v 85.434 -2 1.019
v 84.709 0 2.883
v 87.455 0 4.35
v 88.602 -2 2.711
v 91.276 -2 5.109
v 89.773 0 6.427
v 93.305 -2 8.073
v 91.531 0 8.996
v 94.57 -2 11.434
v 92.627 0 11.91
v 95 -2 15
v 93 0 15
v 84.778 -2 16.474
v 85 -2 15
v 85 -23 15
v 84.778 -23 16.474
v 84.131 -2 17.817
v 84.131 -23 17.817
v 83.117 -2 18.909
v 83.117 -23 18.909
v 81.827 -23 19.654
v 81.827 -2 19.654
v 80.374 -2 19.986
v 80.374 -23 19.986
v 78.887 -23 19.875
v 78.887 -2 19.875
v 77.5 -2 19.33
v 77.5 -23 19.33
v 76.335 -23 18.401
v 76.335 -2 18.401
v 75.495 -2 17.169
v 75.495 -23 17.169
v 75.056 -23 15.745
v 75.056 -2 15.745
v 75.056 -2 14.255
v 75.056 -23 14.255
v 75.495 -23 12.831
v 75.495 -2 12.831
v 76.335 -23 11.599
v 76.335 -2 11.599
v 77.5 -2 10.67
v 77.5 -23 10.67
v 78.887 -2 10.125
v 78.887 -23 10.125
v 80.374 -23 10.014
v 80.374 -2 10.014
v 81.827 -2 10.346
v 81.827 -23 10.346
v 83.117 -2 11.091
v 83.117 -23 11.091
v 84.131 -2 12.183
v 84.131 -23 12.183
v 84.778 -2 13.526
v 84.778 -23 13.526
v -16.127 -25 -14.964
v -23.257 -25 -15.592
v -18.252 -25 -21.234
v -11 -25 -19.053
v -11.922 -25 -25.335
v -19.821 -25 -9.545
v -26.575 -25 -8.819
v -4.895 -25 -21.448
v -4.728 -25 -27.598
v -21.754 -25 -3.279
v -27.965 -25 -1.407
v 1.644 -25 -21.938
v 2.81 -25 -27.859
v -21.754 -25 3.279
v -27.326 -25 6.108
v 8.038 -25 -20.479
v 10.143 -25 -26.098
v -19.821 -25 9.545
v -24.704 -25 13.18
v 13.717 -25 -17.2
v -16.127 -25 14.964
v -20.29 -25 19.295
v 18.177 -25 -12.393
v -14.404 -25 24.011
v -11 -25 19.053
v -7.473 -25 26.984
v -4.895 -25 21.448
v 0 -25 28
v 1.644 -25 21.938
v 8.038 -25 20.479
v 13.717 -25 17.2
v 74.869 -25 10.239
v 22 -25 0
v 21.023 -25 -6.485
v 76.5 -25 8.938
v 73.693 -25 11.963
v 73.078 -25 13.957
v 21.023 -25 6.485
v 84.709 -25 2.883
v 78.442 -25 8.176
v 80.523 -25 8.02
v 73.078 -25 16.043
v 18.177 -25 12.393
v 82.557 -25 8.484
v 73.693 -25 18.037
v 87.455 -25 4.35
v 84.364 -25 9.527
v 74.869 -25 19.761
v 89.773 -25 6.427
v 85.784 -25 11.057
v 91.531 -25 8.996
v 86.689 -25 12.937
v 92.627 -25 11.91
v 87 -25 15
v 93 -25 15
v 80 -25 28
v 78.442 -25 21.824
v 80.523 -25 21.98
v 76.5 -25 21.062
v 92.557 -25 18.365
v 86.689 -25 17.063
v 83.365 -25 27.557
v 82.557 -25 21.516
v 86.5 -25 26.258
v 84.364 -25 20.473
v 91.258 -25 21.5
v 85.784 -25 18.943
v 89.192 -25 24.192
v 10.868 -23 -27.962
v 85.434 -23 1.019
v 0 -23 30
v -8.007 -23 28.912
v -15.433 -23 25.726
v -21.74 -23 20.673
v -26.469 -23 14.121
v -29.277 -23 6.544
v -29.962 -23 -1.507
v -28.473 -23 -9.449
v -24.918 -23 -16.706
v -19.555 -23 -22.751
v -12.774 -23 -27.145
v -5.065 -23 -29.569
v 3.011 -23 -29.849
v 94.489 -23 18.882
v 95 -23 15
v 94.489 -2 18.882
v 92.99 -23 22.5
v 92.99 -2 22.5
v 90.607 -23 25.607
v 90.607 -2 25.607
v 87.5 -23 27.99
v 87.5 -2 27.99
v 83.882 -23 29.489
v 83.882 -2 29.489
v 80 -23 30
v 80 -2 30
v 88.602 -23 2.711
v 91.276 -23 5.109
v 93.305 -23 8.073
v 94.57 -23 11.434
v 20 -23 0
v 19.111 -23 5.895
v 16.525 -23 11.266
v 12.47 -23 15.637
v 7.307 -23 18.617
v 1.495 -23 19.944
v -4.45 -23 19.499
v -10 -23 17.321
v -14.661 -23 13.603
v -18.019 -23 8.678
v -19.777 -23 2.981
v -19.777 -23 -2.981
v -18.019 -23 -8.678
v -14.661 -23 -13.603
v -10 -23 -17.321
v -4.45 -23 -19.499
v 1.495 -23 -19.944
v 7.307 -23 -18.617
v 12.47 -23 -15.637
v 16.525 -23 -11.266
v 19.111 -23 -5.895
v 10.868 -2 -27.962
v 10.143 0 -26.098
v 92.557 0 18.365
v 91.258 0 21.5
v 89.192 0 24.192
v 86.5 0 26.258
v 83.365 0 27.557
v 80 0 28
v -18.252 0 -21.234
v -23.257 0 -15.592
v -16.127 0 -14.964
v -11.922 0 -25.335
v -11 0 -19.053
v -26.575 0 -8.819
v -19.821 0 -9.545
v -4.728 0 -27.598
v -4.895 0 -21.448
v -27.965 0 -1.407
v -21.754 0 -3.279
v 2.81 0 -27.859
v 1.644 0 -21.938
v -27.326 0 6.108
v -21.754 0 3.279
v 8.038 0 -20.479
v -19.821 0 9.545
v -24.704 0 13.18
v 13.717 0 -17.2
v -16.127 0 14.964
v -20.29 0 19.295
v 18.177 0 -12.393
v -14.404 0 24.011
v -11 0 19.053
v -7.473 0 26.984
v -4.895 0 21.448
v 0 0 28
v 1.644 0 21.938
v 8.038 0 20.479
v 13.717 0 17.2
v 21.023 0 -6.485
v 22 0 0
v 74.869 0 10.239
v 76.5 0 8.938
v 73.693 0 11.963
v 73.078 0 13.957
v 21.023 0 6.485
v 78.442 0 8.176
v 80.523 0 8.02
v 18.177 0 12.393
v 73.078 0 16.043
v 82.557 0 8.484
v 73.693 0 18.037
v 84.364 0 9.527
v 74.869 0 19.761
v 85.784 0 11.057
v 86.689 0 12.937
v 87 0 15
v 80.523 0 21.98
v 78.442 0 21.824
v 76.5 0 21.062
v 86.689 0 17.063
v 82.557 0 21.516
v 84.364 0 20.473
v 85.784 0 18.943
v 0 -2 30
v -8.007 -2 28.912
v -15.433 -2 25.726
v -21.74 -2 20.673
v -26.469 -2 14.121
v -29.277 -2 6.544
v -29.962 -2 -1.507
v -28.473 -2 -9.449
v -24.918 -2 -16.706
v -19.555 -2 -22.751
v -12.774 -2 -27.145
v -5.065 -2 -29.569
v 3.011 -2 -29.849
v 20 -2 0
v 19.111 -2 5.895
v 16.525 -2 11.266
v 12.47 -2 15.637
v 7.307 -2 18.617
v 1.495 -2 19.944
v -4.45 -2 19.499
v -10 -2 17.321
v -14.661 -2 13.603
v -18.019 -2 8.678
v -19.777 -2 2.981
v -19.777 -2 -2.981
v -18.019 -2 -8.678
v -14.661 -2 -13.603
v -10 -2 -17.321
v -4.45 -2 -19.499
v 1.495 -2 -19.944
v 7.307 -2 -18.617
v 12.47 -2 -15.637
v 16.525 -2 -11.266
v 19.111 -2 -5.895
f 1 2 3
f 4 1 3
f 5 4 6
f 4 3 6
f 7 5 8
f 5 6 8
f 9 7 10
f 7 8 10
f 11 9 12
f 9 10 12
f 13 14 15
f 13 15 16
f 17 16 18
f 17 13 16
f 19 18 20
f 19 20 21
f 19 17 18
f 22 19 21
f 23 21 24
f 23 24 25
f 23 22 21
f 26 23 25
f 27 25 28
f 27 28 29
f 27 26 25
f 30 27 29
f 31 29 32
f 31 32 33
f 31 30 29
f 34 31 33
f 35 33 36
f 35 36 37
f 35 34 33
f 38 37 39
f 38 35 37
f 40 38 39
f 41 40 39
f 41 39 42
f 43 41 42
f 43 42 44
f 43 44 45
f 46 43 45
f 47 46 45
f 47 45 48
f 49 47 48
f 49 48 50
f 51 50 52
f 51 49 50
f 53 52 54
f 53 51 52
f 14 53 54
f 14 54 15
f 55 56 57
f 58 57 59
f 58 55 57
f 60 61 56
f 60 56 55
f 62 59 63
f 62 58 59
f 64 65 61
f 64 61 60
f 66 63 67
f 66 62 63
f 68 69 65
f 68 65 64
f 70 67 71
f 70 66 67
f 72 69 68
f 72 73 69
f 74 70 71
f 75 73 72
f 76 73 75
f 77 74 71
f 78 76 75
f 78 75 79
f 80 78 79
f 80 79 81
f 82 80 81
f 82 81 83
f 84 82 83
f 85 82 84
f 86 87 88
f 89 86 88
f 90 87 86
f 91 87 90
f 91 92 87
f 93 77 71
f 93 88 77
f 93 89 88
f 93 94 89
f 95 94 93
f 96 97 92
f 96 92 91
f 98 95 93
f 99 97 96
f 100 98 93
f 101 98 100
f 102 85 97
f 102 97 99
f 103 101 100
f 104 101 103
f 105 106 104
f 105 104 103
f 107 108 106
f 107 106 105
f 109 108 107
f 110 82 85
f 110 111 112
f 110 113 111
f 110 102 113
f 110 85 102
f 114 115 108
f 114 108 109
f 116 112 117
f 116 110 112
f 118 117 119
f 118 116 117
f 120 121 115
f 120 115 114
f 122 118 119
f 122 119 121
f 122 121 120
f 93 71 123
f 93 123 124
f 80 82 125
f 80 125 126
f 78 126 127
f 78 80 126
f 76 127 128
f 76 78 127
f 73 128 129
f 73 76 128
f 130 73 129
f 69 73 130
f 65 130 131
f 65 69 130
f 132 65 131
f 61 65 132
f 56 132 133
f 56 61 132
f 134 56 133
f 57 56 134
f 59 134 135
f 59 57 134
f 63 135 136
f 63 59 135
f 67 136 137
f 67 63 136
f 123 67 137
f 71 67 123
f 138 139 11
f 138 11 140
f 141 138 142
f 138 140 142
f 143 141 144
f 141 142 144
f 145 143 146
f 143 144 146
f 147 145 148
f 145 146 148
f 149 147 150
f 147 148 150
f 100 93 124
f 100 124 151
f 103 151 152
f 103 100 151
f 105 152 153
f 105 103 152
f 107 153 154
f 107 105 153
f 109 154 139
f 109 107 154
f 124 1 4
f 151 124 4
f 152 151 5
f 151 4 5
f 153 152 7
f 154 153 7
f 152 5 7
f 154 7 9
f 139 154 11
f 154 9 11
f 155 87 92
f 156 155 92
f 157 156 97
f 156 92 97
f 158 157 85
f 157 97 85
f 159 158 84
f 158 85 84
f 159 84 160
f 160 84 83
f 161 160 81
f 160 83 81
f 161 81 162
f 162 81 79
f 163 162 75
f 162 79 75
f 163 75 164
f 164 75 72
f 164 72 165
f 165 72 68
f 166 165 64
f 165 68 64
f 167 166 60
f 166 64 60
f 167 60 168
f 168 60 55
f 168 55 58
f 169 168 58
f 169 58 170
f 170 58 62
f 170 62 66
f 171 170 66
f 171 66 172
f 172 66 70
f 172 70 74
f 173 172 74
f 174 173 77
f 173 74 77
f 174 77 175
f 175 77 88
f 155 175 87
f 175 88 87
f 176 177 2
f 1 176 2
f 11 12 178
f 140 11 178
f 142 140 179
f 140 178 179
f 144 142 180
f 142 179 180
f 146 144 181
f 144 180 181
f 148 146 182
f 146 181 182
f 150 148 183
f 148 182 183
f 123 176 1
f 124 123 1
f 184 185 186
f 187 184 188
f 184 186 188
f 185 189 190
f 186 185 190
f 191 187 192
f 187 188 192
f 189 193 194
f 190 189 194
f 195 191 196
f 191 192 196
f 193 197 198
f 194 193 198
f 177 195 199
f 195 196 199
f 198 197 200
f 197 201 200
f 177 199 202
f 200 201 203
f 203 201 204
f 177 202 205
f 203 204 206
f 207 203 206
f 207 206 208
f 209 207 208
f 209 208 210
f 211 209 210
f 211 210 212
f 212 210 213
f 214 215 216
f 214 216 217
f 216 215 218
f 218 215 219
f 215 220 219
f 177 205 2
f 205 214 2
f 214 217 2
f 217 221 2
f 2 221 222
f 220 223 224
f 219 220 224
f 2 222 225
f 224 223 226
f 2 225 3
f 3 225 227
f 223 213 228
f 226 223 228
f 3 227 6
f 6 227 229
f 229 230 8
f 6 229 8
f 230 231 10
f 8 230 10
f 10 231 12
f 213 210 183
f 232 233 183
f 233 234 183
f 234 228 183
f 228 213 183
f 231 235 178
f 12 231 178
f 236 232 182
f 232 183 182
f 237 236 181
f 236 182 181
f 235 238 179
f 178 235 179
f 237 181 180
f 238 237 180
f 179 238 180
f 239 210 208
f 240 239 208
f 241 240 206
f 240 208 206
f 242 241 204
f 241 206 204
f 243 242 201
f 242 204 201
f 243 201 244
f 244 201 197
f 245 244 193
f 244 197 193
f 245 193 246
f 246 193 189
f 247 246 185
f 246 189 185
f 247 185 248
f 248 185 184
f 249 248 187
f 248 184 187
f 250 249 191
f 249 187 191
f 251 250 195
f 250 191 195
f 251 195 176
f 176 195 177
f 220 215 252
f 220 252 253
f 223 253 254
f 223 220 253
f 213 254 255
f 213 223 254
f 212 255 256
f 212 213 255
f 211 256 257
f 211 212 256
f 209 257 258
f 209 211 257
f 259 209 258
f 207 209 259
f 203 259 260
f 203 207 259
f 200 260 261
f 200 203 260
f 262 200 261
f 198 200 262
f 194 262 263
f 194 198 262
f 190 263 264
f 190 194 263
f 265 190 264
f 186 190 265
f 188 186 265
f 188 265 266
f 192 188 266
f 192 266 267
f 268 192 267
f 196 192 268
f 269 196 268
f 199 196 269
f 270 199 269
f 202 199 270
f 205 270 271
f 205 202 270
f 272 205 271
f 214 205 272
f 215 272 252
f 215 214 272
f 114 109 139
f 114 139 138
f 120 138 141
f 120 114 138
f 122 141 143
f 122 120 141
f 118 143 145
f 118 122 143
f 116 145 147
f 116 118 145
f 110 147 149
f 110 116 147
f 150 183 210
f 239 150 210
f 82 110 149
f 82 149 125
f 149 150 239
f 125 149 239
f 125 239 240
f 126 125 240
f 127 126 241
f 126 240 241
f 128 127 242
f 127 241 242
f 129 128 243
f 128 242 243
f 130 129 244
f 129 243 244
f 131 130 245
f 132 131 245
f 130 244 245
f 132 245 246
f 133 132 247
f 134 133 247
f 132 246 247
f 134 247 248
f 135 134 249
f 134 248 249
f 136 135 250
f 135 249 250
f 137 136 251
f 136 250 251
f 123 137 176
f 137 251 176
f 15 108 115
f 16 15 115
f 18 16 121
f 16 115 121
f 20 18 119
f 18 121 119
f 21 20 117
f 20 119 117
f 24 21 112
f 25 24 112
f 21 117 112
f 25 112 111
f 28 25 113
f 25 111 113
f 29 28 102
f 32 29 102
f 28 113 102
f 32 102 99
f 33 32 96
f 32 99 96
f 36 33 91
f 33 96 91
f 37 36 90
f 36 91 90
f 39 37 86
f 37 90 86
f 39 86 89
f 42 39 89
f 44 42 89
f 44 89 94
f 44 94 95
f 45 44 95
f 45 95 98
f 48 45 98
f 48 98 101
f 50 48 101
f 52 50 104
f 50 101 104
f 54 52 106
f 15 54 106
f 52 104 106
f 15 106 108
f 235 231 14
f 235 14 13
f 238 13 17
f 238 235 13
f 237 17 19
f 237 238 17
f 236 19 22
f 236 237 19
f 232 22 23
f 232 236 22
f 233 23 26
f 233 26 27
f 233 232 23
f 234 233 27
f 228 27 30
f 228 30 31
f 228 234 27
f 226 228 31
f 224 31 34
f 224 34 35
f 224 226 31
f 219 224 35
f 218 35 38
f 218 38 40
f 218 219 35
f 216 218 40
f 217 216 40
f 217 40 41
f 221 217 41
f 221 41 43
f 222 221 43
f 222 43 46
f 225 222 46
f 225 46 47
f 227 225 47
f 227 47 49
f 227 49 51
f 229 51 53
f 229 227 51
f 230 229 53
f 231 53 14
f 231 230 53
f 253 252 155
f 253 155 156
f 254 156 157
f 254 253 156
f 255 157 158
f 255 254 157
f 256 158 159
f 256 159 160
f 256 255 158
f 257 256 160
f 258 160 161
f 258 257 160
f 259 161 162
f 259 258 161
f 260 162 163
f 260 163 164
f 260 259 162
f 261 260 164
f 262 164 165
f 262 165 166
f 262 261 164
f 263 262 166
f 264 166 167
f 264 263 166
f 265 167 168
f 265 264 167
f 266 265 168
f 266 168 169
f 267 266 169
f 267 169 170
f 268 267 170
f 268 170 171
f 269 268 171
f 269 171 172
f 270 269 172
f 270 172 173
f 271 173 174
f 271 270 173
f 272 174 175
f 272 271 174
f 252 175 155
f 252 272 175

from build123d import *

# Parameters (mm, degrees)
F0_R     = 20
F0_R_2   = 4.999997
F1_DEPTH = 25
F2_SIZE  = 2


with BuildPart() as f1:
    # F0 (on Front) → F1 (new body)
    with BuildSketch(Plane.XZ):
        with BuildLine():
            ThreePointArc((10.867925, -27.962264), (24.759218, -16.940517), (30, 0))
            ThreePointArc((30, 0), (21.213203, 21.213203), (0, 30))
            ThreePointArc((0, 30), (-29.486166, -5.528656), (10.867925, -27.962264))
        make_face()
        Circle(F0_R, mode=Mode.SUBTRACT)
        with BuildLine():
            ThreePointArc((0, 30), (21.213203, 21.213203), (30, 0))
            ThreePointArc((30, 0), (24.759218, -16.940517), (10.867925, -27.962264))
            Line((10.867925, -27.962264), (85.433962, 1.018868))
            ThreePointArc((85.433962, 1.018868), (65.256917, 12.235672), (80, 30))
            Line((80, 30), (0, 30))
        make_face()
        with BuildLine():
            ThreePointArc((95, 15), (90.606602, 25.606602), (80, 30))
            ThreePointArc((80, 30), (65.256917, 12.235672), (85.433962, 1.018868))
            ThreePointArc((85.433962, 1.018868), (92.379609, 6.529741), (95, 15))
        make_face()
        with Locations((80, 15)):
            Circle(F0_R_2, mode=Mode.SUBTRACT)
    extrude(amount=F1_DEPTH)

    # F2
    f2_edges = [f1.edges().sort_by_distance(p)[0] for p in [
        (-20, -25, 0),
        (75.000003, -25, 15),
        (-20, 0, 0),
        (75.000003, 0, 15),
        (40, 0, 30),
        (40, -25, 30),
    ]]
    chamfer(f2_edges, length=F2_SIZE)


solid = f1.part
